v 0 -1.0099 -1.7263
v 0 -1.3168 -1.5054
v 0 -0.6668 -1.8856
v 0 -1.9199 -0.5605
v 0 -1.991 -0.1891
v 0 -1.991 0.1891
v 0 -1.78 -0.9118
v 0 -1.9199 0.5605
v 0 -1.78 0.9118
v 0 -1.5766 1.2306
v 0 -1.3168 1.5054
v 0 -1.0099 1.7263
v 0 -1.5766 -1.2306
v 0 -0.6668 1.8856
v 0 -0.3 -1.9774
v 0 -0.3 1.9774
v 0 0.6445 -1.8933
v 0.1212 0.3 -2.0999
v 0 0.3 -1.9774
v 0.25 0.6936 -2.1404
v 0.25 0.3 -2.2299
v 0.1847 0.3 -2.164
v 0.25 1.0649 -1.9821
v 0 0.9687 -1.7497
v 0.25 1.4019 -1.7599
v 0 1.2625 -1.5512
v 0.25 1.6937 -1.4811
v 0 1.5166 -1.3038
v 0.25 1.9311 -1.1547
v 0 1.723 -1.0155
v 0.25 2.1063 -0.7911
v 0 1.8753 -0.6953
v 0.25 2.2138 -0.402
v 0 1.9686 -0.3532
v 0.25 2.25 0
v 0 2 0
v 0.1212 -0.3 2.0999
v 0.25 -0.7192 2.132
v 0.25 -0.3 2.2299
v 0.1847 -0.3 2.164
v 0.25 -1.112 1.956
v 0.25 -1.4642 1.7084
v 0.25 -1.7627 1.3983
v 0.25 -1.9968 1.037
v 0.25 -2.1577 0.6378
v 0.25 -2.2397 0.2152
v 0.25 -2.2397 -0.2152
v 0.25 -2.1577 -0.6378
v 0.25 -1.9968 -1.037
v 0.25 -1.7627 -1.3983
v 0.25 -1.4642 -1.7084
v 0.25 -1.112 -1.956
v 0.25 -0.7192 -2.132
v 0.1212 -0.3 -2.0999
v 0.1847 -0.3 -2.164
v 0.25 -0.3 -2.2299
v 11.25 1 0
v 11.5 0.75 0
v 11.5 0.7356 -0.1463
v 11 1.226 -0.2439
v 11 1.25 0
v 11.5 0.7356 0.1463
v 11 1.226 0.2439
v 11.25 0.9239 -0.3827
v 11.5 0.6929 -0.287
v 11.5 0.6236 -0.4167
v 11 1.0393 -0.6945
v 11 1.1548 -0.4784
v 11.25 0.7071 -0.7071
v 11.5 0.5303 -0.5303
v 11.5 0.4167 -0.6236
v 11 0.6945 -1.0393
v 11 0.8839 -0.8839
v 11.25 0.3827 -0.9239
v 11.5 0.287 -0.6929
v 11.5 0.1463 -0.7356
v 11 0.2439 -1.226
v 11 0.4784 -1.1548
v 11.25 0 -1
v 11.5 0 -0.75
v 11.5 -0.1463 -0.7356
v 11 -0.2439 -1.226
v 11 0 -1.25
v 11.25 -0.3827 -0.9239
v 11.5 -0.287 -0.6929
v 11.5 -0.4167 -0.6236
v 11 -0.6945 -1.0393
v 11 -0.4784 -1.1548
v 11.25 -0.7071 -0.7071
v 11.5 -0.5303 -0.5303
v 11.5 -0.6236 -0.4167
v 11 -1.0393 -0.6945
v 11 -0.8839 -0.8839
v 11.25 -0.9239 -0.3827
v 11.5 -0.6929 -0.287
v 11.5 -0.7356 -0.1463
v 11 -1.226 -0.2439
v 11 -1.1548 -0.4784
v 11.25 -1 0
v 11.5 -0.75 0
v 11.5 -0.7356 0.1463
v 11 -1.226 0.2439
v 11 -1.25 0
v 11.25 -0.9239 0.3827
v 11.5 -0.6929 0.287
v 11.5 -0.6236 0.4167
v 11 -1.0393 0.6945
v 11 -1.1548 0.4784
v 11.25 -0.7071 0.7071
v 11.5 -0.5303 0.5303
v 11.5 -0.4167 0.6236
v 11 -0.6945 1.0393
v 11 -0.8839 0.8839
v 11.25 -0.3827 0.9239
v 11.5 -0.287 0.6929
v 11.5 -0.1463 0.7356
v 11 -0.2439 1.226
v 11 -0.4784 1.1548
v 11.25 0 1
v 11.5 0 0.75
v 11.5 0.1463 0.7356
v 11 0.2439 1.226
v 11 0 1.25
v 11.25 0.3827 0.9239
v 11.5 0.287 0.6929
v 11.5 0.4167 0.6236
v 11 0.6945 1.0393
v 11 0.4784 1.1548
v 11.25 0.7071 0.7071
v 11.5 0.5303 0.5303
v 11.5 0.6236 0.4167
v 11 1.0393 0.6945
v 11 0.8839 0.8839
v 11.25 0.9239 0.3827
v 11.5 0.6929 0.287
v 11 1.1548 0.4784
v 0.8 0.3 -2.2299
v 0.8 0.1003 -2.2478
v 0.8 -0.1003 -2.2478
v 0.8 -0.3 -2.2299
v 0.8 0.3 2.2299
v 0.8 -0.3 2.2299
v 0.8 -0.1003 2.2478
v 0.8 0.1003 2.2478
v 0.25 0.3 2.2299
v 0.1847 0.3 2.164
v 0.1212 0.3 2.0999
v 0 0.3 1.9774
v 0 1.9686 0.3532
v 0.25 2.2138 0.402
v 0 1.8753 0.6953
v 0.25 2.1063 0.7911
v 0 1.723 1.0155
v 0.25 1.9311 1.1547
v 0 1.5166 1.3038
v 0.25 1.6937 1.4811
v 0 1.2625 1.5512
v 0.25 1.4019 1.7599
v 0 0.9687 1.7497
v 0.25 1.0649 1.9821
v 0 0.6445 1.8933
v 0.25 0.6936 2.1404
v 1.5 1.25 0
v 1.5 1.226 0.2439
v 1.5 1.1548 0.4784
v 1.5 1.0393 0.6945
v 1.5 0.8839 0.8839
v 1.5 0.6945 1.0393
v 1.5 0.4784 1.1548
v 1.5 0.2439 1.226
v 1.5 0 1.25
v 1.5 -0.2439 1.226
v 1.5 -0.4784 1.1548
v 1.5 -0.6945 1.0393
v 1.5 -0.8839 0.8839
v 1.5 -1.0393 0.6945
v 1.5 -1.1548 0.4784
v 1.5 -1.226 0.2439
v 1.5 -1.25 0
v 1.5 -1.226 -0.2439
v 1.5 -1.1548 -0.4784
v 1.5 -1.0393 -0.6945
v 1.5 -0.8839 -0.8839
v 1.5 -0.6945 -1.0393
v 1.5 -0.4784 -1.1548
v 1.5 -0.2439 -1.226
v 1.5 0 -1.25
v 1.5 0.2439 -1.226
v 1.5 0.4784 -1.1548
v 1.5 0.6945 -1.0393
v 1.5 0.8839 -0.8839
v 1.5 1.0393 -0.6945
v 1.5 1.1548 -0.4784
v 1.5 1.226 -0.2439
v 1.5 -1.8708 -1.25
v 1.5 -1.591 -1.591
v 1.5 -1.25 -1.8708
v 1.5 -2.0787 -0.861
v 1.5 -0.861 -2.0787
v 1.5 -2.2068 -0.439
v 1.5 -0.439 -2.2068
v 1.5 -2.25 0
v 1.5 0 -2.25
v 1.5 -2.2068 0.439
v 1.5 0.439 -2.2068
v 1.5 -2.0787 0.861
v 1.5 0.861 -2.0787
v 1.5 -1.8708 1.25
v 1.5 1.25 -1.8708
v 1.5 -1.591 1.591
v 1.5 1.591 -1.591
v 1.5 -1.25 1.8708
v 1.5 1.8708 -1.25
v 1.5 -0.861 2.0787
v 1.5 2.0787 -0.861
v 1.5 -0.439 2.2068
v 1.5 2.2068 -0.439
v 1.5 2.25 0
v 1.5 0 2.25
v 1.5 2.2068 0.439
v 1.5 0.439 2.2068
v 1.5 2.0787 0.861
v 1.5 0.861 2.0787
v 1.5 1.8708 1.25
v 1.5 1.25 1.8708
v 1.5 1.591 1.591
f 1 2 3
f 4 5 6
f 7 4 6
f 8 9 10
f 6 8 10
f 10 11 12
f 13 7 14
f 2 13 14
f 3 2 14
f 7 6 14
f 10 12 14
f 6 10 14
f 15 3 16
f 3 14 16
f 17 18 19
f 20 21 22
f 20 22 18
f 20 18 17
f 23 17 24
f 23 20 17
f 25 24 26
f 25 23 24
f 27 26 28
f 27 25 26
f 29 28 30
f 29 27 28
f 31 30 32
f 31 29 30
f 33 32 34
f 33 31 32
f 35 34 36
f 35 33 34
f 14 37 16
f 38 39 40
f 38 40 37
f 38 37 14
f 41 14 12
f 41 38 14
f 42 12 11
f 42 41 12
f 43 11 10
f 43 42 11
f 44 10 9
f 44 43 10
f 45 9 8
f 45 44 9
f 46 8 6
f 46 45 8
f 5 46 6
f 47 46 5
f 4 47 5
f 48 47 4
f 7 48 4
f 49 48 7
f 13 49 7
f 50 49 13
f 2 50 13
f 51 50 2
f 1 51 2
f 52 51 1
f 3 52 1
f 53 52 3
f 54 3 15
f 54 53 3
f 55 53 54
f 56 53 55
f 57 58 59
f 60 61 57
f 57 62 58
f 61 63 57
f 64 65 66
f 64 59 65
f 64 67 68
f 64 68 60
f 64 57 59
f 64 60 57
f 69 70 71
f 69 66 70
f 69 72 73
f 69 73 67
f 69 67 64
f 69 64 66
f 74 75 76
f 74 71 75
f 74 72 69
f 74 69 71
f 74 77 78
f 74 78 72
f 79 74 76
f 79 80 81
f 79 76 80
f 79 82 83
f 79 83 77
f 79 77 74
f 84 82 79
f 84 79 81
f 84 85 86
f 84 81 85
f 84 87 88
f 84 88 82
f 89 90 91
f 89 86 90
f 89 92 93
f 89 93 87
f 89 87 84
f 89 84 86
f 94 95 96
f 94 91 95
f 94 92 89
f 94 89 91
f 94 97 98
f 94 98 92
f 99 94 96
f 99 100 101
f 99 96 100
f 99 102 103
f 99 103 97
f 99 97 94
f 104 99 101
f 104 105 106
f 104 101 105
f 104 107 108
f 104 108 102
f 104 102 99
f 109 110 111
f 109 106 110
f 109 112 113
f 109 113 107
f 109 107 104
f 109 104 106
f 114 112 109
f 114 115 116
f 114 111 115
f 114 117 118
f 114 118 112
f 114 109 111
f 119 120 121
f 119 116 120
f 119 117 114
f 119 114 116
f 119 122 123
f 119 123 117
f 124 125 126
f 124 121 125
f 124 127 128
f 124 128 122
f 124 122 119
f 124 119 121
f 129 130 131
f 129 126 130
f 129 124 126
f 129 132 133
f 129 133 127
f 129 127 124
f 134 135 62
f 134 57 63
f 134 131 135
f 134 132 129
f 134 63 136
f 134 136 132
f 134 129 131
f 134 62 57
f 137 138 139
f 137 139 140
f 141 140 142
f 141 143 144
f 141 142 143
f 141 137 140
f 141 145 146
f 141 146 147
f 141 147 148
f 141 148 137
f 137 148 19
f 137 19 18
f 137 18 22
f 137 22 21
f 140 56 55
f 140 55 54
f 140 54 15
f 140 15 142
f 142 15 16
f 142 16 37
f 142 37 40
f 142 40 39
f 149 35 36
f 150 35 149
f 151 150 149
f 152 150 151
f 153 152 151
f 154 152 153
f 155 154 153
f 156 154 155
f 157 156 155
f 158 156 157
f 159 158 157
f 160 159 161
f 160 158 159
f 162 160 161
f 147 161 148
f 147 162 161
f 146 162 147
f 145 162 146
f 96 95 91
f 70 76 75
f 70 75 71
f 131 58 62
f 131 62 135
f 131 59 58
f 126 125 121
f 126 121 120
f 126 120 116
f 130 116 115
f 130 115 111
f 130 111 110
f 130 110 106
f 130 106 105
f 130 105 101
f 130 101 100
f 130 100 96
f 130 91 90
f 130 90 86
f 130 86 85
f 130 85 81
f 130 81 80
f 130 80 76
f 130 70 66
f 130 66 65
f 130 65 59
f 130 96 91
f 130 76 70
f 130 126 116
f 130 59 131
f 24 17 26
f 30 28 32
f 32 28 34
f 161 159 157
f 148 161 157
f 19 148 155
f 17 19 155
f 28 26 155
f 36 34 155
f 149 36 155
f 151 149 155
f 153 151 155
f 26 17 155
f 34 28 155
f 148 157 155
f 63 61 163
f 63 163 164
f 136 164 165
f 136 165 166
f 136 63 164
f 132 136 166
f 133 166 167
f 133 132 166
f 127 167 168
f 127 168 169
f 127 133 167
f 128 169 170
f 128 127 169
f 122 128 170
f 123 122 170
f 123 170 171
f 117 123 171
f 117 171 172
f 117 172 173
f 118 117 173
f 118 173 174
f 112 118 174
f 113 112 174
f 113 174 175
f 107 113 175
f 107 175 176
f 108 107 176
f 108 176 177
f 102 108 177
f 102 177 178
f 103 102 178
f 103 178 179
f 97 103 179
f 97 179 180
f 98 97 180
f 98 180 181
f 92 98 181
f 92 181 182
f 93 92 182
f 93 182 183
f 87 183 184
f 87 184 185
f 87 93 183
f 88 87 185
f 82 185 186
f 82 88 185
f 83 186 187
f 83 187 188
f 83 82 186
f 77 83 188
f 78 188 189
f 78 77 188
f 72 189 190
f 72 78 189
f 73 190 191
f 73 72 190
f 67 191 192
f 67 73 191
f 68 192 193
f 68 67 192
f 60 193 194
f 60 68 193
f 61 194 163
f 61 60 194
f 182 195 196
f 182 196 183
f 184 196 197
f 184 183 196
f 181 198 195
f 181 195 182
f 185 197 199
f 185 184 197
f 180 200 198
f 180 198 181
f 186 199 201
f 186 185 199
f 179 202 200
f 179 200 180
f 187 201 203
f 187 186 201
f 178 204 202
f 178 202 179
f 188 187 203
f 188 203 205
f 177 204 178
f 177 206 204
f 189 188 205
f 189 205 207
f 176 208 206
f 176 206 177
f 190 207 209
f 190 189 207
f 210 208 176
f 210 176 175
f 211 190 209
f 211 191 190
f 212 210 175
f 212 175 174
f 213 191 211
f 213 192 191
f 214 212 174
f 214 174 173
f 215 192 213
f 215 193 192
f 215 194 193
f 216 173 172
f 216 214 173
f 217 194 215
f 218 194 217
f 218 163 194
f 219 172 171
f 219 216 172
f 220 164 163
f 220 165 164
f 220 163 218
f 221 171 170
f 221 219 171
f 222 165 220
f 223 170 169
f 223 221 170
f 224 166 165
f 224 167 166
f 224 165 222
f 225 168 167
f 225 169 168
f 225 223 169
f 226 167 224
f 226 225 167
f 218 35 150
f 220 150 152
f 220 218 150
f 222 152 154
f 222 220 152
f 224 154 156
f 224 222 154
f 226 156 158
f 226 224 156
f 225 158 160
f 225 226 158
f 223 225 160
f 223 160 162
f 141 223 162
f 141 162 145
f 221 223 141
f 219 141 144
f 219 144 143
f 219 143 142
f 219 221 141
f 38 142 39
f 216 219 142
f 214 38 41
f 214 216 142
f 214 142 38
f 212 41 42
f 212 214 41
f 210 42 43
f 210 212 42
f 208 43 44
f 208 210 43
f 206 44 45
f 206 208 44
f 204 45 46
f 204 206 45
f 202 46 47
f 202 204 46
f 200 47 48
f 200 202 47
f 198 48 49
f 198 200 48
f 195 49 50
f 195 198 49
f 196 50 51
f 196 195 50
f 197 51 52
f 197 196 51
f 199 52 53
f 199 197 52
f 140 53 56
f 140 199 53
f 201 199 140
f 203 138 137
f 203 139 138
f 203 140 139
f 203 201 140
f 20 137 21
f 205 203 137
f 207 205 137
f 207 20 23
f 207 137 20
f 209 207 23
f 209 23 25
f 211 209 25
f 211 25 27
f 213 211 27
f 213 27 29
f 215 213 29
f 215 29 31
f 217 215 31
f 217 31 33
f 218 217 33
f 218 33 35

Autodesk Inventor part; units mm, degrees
ref_plane "YZ-Ebene" through (0, 0, 0) normal (1, 0, 0) x (0, 1, 0)
ref_plane "XZ-Ebene" through (0, 0, 0) normal (0, 1, 0) x (-1, 0, 0)
ref_plane "XY-Ebene" through (0, 0, 0) normal (0, 0, 1) x (1, 0, 0)
sketch "Skizze1" plane through (0, 0, 0) normal (0, 0, 1) x (1, 0, 0)
  line L0 (-2.3, 0) -> (13.8, 0) projected
  line L1 (0, -0.45) -> (0, 2.7) projected
  line L2 (0, 2.25) -> (1.5, 2.25)
  line L3 (1.5, 2.25) -> (1.5, 1.25)
  line L4 (1.5, 1.25) -> (11.5, 1.25)
  line L5 (11.5, 1.25) -> (11.5, 0)
  point P0 (0, 0)
  dimension "d0" = 1.5
  dimension "d1" = 10
  dimension "d16" = 2.5
  dimension "d17" = 4.5
revolve "Umdrehung1" add sketch "Skizze1" angle 360 about axis through (-10, 0, 0) along (1, 0, 0)
sketch "Skizze2" plane through (0, 0, 0) normal (-1, 0, 0) x (0, 0, 1)
  circle A0 centre (0, 0) radius 2.25 projected
  line L0 (-3.15, 0) -> (3.15, 0) projected
  line L1 (2.2299, 0.3) -> (-2.2299, 0.3)
  line L2 (-2.2299, -0.3) -> (2.2299, -0.3)
  dimension "d5" = 0.6
extrude "Extrusion1" cut sketch "Skizze2" against normal blind 0.8 contours L0 A0 L1 | A0 L2 L0
chamfer "Fase1" distance 0.5 angle 45 1 edges at (11.5, -1.25, 0)
thread "Gewinde1" size "M2.5x0.45" class "6g" standard "ISO Metric profile" length 7.5
chamfer "Fase2" distance 0.25 angle 45 3 edges at (0, -2.25, 0) (0, 1.6937, 1.4811) (0, 1.6937, -1.4811)
properties part number "Schlitzschraube_ra8846s-01" material "Stahl"
